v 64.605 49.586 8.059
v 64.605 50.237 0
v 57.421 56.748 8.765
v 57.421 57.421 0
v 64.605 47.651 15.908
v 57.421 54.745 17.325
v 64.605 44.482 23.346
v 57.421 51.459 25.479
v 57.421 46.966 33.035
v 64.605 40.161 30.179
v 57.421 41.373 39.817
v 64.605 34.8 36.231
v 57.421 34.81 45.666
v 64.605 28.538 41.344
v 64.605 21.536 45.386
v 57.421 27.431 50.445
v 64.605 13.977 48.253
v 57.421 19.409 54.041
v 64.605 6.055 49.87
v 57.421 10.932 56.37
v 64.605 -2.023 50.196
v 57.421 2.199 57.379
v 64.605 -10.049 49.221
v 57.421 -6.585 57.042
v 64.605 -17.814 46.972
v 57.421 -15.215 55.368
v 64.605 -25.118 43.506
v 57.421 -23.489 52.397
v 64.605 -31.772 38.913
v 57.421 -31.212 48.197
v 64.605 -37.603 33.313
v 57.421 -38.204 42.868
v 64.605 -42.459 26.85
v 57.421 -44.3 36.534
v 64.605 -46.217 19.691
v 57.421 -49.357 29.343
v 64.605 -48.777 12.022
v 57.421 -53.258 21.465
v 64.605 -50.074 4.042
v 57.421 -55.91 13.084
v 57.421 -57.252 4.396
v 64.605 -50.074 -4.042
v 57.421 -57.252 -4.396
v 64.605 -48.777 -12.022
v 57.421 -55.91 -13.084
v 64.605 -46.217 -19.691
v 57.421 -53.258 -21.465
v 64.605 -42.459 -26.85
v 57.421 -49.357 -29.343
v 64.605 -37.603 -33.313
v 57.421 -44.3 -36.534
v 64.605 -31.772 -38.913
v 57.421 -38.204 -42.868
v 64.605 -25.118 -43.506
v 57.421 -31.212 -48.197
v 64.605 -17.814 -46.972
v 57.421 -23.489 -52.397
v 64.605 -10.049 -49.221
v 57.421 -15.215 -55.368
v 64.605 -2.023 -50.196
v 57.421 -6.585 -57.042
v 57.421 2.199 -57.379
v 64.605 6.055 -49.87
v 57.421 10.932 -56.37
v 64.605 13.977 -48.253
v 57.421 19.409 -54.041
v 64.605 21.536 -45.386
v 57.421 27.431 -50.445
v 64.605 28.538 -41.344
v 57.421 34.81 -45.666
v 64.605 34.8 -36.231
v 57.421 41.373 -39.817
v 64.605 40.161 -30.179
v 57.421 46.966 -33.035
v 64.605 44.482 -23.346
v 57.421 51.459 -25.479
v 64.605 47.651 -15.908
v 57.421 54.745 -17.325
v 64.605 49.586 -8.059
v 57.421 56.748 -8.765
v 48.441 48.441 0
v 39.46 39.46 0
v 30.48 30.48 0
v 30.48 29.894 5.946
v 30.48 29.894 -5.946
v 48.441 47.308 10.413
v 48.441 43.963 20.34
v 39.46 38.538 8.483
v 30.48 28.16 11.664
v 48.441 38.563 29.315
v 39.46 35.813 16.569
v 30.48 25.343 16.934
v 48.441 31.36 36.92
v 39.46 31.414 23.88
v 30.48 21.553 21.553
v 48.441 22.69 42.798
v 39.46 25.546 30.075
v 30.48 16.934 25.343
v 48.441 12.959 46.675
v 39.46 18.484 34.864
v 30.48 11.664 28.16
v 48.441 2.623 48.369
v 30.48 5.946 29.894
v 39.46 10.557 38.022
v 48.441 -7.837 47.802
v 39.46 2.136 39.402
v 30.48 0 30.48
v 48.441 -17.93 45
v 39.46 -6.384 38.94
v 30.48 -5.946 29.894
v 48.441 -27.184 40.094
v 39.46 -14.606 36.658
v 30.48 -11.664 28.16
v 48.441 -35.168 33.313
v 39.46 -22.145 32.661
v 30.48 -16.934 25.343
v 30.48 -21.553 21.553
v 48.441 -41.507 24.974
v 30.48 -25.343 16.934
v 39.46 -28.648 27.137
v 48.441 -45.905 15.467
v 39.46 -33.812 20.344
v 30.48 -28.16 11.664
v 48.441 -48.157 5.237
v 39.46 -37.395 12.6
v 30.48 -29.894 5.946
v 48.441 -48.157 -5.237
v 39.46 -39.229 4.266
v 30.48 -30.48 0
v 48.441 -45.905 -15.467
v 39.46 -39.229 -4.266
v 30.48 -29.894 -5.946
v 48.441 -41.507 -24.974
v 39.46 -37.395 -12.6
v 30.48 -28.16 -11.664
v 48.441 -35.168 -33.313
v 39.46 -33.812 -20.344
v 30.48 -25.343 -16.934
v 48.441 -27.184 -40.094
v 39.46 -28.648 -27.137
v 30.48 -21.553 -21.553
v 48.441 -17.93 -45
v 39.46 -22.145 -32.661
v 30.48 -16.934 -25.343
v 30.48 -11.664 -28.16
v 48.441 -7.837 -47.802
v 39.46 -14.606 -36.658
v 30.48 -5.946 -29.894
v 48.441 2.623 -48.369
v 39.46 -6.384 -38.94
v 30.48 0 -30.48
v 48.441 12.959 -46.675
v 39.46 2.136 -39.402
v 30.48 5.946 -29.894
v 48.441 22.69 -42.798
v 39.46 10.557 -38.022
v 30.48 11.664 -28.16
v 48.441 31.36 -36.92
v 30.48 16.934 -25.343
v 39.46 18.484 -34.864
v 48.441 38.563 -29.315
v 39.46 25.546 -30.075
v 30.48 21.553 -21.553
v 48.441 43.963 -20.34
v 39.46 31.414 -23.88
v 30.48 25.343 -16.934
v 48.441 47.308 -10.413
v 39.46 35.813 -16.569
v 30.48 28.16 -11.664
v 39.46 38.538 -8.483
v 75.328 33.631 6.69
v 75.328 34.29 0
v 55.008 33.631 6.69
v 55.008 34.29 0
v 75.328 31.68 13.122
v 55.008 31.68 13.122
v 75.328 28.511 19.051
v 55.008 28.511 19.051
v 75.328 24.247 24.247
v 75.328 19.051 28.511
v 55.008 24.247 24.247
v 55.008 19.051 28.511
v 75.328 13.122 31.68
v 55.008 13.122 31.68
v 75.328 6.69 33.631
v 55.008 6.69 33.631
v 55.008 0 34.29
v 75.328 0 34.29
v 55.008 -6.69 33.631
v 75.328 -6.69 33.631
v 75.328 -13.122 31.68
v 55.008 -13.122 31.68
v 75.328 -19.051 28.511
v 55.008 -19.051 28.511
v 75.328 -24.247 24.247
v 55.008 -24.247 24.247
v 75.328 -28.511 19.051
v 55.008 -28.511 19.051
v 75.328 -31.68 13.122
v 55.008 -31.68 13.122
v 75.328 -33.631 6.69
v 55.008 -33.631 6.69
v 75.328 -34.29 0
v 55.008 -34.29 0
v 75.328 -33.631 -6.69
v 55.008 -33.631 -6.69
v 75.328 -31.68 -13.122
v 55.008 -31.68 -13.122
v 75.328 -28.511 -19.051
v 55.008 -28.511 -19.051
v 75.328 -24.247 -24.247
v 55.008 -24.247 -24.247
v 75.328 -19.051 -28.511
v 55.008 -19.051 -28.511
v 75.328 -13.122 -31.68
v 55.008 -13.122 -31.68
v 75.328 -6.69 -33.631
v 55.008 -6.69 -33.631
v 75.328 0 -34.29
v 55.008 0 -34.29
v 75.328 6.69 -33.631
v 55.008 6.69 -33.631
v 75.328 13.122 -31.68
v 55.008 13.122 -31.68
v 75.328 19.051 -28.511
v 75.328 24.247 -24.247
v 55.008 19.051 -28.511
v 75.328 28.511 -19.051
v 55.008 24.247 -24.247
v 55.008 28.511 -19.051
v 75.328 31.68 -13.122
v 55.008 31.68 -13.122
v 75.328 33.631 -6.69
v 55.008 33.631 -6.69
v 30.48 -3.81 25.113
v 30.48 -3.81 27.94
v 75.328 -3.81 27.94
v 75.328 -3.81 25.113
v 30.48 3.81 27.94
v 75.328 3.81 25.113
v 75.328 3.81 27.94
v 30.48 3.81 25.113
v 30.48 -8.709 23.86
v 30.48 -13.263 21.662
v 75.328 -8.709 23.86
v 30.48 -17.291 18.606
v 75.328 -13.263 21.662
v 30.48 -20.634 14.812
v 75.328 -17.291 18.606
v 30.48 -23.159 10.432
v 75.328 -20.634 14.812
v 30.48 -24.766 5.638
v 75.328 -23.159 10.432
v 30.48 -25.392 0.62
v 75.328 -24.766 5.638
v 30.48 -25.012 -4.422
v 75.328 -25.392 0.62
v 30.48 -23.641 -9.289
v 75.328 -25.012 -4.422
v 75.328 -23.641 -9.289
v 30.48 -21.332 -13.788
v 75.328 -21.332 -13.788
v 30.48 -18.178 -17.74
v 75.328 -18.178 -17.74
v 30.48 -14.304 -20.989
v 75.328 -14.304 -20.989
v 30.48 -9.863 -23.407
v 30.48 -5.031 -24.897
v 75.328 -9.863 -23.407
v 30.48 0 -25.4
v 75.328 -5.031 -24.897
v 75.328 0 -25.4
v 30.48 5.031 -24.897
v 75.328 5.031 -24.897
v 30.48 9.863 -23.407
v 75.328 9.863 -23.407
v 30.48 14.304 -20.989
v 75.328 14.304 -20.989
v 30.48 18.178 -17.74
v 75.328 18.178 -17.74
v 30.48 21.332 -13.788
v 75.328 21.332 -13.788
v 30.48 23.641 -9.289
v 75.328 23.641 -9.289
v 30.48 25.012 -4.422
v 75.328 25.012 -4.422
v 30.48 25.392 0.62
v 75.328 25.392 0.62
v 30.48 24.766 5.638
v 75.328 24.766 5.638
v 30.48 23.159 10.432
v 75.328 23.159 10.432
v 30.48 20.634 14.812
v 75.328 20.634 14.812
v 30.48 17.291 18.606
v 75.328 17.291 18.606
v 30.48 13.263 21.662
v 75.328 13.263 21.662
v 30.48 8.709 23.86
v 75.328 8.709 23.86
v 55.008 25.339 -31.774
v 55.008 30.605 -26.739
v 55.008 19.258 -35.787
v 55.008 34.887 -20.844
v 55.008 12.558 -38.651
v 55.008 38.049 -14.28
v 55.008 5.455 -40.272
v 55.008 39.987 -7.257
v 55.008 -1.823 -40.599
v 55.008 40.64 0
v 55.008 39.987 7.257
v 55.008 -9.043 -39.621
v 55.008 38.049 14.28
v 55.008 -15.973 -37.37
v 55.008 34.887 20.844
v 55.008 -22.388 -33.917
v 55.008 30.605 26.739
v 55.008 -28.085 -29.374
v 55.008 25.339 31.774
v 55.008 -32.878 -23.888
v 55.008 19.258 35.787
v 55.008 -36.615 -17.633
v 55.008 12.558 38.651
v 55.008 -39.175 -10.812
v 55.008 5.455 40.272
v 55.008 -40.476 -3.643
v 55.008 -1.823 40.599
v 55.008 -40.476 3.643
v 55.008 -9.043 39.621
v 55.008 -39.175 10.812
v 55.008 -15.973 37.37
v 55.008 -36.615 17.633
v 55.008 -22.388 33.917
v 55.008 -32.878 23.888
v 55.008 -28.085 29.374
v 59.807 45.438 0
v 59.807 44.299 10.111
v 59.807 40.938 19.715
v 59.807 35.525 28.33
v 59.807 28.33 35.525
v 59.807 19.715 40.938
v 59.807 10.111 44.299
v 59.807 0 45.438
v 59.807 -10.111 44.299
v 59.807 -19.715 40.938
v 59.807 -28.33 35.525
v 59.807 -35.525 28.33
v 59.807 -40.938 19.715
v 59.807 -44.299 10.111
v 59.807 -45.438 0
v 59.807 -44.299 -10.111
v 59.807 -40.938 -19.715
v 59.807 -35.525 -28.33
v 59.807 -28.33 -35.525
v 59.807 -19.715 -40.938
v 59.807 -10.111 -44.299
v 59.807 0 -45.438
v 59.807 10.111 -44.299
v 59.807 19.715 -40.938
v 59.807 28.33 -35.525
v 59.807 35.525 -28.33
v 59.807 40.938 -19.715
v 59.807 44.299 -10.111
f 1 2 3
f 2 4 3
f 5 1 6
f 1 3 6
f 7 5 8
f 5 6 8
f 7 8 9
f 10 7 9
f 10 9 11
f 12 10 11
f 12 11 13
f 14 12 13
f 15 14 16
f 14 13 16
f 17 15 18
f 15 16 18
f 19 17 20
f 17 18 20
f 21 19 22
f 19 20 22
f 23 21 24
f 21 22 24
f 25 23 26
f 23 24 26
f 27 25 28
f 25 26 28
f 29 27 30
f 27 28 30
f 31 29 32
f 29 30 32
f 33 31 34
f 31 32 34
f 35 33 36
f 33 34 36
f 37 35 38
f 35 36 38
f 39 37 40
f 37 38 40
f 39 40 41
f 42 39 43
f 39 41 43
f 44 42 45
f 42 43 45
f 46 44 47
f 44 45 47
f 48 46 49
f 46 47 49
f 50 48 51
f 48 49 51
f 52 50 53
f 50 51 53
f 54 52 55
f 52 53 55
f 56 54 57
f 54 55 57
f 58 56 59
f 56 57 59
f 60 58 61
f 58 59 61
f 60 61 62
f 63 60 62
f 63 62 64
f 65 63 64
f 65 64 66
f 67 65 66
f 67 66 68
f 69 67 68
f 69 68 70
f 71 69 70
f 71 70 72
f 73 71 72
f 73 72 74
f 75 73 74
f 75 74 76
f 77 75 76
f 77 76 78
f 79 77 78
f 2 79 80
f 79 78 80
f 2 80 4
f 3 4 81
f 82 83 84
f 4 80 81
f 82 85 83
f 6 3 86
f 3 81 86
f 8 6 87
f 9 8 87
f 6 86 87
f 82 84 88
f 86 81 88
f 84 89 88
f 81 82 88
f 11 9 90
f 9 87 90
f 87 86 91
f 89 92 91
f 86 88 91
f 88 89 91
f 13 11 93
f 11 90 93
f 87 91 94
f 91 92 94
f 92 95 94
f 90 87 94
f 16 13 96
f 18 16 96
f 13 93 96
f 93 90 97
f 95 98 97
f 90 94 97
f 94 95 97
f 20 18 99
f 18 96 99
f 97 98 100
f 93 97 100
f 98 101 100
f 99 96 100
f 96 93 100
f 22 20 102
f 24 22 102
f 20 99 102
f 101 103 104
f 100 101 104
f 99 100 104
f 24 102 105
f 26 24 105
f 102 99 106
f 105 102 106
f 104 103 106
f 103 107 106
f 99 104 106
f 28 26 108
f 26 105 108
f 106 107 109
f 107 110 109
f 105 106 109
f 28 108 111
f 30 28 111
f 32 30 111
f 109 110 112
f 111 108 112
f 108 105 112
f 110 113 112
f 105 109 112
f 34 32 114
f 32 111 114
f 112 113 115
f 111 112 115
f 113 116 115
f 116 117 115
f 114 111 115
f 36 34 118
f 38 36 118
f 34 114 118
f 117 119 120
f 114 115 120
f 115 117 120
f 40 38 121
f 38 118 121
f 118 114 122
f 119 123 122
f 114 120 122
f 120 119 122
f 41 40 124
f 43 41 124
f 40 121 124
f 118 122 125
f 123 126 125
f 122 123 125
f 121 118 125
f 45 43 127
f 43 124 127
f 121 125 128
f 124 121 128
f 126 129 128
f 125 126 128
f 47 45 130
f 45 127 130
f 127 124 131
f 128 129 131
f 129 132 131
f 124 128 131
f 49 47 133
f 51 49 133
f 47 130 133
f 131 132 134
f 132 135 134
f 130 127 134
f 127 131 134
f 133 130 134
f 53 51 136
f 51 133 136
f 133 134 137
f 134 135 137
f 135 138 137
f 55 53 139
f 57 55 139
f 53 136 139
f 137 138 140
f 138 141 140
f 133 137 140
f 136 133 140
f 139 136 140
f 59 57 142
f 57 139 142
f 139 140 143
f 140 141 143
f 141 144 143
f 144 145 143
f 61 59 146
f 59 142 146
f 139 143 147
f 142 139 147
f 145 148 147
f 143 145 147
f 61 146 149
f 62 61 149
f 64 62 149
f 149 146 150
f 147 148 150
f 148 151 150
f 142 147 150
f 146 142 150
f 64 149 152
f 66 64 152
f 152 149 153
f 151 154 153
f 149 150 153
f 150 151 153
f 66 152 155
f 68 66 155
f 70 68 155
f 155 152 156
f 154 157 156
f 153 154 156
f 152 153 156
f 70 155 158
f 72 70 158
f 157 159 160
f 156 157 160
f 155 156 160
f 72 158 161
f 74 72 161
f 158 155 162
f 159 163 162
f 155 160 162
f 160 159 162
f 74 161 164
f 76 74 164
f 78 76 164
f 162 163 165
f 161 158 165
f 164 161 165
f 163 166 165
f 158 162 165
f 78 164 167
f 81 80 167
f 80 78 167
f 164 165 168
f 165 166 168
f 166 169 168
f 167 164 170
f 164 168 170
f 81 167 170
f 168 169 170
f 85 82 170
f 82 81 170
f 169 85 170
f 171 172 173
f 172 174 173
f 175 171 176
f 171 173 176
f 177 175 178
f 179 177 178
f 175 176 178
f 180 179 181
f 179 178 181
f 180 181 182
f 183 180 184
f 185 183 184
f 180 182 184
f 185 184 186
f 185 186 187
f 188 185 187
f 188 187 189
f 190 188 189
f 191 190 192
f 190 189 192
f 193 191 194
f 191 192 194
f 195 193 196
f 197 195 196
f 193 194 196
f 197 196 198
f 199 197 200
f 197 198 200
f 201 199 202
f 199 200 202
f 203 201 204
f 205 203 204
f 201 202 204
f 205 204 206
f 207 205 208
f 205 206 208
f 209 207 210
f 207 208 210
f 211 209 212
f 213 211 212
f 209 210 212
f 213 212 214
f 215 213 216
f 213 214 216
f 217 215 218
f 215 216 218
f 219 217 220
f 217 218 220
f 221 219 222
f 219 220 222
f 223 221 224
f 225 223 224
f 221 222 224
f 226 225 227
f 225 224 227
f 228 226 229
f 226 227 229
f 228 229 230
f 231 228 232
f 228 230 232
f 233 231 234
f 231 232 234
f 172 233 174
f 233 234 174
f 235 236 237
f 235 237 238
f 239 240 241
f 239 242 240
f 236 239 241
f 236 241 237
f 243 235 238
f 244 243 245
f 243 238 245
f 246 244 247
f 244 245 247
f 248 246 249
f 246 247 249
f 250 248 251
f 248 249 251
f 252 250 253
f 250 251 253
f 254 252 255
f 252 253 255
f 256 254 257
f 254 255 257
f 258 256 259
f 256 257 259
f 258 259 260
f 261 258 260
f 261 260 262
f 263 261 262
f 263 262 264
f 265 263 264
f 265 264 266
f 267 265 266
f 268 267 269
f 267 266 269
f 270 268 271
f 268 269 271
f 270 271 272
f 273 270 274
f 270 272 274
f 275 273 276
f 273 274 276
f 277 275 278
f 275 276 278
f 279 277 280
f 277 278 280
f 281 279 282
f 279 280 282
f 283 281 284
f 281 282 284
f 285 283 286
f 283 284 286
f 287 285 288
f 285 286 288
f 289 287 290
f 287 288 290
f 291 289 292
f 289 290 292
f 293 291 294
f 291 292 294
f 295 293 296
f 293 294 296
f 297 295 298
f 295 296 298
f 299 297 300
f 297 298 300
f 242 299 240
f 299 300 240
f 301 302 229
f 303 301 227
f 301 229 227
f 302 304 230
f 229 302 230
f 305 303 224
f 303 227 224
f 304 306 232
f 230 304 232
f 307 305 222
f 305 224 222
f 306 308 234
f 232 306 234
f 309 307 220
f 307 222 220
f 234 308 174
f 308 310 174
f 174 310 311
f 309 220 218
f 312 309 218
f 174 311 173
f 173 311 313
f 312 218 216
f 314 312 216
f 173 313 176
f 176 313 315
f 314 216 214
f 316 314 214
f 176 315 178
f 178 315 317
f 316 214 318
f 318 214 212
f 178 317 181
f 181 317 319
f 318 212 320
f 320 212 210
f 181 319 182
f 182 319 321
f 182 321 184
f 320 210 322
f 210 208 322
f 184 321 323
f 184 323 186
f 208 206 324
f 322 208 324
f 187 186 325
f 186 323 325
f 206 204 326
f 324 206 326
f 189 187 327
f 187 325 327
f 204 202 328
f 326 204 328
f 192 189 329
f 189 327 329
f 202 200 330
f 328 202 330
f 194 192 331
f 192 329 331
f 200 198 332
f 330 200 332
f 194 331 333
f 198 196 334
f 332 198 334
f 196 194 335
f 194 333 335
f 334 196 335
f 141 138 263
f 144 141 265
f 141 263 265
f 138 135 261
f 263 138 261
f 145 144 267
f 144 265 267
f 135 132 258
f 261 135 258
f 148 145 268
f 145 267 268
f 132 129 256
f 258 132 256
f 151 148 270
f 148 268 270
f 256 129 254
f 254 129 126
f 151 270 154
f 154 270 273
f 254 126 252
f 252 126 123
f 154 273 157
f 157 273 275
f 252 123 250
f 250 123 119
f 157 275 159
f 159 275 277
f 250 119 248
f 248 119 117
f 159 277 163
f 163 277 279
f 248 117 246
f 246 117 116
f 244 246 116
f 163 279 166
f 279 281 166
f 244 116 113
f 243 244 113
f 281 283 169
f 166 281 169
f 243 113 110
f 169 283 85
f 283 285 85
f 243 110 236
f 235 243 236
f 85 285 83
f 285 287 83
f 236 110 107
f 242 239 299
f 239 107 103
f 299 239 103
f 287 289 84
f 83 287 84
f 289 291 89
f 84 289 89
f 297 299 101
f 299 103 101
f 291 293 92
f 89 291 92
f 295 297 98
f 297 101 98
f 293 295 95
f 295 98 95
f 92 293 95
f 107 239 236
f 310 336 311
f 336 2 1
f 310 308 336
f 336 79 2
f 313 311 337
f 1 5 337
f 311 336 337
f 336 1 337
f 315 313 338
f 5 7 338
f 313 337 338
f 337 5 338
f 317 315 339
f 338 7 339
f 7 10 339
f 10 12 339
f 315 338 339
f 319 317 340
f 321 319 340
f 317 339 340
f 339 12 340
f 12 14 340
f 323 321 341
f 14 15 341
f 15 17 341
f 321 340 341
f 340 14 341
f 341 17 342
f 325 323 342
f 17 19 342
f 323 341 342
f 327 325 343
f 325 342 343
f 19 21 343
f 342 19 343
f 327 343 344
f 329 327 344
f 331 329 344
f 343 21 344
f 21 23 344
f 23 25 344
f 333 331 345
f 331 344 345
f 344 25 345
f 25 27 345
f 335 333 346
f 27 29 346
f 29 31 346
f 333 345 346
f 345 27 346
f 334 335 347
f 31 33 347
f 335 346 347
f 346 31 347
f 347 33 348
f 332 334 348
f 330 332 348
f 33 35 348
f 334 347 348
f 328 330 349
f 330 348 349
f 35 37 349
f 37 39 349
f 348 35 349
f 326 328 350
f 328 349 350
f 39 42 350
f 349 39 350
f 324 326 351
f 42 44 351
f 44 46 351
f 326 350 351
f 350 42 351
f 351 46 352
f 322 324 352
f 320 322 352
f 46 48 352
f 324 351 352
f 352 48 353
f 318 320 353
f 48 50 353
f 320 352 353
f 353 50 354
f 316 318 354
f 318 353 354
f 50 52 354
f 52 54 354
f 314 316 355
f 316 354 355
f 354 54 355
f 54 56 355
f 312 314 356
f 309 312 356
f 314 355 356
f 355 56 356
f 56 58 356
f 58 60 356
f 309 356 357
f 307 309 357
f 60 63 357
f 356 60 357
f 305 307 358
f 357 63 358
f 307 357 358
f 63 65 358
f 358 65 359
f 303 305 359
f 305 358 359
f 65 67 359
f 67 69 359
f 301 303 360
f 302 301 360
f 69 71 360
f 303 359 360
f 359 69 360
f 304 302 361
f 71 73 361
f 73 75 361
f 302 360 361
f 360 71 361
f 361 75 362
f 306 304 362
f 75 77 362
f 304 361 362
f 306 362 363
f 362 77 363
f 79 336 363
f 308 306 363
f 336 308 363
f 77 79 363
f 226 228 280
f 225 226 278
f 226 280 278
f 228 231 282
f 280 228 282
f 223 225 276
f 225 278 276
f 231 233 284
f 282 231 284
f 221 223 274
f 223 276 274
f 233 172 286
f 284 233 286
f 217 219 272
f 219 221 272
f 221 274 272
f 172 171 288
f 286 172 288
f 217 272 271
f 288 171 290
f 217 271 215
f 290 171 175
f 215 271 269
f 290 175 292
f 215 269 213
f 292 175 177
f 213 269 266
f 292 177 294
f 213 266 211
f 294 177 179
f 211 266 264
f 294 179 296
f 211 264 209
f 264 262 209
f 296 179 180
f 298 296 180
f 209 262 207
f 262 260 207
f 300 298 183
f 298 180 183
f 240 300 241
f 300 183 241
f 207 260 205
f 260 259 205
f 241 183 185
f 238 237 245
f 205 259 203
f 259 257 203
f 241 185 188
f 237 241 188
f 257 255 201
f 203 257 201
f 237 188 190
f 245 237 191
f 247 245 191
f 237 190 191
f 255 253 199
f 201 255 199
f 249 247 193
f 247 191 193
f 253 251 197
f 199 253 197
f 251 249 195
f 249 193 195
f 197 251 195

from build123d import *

# Parameters (mm, degrees)
F3_DEPTH = 75.32841


with BuildPart() as f1:
    # F0 (on Top) → F1 (revolve)
    with BuildSketch(Plane.XY):
        Polygon((75.32841, 25.4), (75.32841, 34.29), (55.00841, 34.29), (55.00841, 40.64), (64.604973, 50.236563), (57.420768, 57.420768), (30.48, 30.48), (30.48, 25.4), align=None)
    revolve(axis=Axis((1.895559, 0, 0), (1, 0, 0)))

    # F2 (on Right) → F3 (cut, through all)
    with BuildSketch(Plane.YZ):
        with BuildLine():
            ThreePointArc((-3.81, 25.112624), (0, 25.4), (3.81, 25.112624))
            Line((3.81, 25.112624), (3.81, 27.94))
            Line((3.81, 27.94), (-3.81, 27.94))
            Line((-3.81, 27.94), (-3.81, 25.112624))
        make_face()
    extrude(amount=F3_DEPTH, mode=Mode.SUBTRACT)


solid = f1.part
